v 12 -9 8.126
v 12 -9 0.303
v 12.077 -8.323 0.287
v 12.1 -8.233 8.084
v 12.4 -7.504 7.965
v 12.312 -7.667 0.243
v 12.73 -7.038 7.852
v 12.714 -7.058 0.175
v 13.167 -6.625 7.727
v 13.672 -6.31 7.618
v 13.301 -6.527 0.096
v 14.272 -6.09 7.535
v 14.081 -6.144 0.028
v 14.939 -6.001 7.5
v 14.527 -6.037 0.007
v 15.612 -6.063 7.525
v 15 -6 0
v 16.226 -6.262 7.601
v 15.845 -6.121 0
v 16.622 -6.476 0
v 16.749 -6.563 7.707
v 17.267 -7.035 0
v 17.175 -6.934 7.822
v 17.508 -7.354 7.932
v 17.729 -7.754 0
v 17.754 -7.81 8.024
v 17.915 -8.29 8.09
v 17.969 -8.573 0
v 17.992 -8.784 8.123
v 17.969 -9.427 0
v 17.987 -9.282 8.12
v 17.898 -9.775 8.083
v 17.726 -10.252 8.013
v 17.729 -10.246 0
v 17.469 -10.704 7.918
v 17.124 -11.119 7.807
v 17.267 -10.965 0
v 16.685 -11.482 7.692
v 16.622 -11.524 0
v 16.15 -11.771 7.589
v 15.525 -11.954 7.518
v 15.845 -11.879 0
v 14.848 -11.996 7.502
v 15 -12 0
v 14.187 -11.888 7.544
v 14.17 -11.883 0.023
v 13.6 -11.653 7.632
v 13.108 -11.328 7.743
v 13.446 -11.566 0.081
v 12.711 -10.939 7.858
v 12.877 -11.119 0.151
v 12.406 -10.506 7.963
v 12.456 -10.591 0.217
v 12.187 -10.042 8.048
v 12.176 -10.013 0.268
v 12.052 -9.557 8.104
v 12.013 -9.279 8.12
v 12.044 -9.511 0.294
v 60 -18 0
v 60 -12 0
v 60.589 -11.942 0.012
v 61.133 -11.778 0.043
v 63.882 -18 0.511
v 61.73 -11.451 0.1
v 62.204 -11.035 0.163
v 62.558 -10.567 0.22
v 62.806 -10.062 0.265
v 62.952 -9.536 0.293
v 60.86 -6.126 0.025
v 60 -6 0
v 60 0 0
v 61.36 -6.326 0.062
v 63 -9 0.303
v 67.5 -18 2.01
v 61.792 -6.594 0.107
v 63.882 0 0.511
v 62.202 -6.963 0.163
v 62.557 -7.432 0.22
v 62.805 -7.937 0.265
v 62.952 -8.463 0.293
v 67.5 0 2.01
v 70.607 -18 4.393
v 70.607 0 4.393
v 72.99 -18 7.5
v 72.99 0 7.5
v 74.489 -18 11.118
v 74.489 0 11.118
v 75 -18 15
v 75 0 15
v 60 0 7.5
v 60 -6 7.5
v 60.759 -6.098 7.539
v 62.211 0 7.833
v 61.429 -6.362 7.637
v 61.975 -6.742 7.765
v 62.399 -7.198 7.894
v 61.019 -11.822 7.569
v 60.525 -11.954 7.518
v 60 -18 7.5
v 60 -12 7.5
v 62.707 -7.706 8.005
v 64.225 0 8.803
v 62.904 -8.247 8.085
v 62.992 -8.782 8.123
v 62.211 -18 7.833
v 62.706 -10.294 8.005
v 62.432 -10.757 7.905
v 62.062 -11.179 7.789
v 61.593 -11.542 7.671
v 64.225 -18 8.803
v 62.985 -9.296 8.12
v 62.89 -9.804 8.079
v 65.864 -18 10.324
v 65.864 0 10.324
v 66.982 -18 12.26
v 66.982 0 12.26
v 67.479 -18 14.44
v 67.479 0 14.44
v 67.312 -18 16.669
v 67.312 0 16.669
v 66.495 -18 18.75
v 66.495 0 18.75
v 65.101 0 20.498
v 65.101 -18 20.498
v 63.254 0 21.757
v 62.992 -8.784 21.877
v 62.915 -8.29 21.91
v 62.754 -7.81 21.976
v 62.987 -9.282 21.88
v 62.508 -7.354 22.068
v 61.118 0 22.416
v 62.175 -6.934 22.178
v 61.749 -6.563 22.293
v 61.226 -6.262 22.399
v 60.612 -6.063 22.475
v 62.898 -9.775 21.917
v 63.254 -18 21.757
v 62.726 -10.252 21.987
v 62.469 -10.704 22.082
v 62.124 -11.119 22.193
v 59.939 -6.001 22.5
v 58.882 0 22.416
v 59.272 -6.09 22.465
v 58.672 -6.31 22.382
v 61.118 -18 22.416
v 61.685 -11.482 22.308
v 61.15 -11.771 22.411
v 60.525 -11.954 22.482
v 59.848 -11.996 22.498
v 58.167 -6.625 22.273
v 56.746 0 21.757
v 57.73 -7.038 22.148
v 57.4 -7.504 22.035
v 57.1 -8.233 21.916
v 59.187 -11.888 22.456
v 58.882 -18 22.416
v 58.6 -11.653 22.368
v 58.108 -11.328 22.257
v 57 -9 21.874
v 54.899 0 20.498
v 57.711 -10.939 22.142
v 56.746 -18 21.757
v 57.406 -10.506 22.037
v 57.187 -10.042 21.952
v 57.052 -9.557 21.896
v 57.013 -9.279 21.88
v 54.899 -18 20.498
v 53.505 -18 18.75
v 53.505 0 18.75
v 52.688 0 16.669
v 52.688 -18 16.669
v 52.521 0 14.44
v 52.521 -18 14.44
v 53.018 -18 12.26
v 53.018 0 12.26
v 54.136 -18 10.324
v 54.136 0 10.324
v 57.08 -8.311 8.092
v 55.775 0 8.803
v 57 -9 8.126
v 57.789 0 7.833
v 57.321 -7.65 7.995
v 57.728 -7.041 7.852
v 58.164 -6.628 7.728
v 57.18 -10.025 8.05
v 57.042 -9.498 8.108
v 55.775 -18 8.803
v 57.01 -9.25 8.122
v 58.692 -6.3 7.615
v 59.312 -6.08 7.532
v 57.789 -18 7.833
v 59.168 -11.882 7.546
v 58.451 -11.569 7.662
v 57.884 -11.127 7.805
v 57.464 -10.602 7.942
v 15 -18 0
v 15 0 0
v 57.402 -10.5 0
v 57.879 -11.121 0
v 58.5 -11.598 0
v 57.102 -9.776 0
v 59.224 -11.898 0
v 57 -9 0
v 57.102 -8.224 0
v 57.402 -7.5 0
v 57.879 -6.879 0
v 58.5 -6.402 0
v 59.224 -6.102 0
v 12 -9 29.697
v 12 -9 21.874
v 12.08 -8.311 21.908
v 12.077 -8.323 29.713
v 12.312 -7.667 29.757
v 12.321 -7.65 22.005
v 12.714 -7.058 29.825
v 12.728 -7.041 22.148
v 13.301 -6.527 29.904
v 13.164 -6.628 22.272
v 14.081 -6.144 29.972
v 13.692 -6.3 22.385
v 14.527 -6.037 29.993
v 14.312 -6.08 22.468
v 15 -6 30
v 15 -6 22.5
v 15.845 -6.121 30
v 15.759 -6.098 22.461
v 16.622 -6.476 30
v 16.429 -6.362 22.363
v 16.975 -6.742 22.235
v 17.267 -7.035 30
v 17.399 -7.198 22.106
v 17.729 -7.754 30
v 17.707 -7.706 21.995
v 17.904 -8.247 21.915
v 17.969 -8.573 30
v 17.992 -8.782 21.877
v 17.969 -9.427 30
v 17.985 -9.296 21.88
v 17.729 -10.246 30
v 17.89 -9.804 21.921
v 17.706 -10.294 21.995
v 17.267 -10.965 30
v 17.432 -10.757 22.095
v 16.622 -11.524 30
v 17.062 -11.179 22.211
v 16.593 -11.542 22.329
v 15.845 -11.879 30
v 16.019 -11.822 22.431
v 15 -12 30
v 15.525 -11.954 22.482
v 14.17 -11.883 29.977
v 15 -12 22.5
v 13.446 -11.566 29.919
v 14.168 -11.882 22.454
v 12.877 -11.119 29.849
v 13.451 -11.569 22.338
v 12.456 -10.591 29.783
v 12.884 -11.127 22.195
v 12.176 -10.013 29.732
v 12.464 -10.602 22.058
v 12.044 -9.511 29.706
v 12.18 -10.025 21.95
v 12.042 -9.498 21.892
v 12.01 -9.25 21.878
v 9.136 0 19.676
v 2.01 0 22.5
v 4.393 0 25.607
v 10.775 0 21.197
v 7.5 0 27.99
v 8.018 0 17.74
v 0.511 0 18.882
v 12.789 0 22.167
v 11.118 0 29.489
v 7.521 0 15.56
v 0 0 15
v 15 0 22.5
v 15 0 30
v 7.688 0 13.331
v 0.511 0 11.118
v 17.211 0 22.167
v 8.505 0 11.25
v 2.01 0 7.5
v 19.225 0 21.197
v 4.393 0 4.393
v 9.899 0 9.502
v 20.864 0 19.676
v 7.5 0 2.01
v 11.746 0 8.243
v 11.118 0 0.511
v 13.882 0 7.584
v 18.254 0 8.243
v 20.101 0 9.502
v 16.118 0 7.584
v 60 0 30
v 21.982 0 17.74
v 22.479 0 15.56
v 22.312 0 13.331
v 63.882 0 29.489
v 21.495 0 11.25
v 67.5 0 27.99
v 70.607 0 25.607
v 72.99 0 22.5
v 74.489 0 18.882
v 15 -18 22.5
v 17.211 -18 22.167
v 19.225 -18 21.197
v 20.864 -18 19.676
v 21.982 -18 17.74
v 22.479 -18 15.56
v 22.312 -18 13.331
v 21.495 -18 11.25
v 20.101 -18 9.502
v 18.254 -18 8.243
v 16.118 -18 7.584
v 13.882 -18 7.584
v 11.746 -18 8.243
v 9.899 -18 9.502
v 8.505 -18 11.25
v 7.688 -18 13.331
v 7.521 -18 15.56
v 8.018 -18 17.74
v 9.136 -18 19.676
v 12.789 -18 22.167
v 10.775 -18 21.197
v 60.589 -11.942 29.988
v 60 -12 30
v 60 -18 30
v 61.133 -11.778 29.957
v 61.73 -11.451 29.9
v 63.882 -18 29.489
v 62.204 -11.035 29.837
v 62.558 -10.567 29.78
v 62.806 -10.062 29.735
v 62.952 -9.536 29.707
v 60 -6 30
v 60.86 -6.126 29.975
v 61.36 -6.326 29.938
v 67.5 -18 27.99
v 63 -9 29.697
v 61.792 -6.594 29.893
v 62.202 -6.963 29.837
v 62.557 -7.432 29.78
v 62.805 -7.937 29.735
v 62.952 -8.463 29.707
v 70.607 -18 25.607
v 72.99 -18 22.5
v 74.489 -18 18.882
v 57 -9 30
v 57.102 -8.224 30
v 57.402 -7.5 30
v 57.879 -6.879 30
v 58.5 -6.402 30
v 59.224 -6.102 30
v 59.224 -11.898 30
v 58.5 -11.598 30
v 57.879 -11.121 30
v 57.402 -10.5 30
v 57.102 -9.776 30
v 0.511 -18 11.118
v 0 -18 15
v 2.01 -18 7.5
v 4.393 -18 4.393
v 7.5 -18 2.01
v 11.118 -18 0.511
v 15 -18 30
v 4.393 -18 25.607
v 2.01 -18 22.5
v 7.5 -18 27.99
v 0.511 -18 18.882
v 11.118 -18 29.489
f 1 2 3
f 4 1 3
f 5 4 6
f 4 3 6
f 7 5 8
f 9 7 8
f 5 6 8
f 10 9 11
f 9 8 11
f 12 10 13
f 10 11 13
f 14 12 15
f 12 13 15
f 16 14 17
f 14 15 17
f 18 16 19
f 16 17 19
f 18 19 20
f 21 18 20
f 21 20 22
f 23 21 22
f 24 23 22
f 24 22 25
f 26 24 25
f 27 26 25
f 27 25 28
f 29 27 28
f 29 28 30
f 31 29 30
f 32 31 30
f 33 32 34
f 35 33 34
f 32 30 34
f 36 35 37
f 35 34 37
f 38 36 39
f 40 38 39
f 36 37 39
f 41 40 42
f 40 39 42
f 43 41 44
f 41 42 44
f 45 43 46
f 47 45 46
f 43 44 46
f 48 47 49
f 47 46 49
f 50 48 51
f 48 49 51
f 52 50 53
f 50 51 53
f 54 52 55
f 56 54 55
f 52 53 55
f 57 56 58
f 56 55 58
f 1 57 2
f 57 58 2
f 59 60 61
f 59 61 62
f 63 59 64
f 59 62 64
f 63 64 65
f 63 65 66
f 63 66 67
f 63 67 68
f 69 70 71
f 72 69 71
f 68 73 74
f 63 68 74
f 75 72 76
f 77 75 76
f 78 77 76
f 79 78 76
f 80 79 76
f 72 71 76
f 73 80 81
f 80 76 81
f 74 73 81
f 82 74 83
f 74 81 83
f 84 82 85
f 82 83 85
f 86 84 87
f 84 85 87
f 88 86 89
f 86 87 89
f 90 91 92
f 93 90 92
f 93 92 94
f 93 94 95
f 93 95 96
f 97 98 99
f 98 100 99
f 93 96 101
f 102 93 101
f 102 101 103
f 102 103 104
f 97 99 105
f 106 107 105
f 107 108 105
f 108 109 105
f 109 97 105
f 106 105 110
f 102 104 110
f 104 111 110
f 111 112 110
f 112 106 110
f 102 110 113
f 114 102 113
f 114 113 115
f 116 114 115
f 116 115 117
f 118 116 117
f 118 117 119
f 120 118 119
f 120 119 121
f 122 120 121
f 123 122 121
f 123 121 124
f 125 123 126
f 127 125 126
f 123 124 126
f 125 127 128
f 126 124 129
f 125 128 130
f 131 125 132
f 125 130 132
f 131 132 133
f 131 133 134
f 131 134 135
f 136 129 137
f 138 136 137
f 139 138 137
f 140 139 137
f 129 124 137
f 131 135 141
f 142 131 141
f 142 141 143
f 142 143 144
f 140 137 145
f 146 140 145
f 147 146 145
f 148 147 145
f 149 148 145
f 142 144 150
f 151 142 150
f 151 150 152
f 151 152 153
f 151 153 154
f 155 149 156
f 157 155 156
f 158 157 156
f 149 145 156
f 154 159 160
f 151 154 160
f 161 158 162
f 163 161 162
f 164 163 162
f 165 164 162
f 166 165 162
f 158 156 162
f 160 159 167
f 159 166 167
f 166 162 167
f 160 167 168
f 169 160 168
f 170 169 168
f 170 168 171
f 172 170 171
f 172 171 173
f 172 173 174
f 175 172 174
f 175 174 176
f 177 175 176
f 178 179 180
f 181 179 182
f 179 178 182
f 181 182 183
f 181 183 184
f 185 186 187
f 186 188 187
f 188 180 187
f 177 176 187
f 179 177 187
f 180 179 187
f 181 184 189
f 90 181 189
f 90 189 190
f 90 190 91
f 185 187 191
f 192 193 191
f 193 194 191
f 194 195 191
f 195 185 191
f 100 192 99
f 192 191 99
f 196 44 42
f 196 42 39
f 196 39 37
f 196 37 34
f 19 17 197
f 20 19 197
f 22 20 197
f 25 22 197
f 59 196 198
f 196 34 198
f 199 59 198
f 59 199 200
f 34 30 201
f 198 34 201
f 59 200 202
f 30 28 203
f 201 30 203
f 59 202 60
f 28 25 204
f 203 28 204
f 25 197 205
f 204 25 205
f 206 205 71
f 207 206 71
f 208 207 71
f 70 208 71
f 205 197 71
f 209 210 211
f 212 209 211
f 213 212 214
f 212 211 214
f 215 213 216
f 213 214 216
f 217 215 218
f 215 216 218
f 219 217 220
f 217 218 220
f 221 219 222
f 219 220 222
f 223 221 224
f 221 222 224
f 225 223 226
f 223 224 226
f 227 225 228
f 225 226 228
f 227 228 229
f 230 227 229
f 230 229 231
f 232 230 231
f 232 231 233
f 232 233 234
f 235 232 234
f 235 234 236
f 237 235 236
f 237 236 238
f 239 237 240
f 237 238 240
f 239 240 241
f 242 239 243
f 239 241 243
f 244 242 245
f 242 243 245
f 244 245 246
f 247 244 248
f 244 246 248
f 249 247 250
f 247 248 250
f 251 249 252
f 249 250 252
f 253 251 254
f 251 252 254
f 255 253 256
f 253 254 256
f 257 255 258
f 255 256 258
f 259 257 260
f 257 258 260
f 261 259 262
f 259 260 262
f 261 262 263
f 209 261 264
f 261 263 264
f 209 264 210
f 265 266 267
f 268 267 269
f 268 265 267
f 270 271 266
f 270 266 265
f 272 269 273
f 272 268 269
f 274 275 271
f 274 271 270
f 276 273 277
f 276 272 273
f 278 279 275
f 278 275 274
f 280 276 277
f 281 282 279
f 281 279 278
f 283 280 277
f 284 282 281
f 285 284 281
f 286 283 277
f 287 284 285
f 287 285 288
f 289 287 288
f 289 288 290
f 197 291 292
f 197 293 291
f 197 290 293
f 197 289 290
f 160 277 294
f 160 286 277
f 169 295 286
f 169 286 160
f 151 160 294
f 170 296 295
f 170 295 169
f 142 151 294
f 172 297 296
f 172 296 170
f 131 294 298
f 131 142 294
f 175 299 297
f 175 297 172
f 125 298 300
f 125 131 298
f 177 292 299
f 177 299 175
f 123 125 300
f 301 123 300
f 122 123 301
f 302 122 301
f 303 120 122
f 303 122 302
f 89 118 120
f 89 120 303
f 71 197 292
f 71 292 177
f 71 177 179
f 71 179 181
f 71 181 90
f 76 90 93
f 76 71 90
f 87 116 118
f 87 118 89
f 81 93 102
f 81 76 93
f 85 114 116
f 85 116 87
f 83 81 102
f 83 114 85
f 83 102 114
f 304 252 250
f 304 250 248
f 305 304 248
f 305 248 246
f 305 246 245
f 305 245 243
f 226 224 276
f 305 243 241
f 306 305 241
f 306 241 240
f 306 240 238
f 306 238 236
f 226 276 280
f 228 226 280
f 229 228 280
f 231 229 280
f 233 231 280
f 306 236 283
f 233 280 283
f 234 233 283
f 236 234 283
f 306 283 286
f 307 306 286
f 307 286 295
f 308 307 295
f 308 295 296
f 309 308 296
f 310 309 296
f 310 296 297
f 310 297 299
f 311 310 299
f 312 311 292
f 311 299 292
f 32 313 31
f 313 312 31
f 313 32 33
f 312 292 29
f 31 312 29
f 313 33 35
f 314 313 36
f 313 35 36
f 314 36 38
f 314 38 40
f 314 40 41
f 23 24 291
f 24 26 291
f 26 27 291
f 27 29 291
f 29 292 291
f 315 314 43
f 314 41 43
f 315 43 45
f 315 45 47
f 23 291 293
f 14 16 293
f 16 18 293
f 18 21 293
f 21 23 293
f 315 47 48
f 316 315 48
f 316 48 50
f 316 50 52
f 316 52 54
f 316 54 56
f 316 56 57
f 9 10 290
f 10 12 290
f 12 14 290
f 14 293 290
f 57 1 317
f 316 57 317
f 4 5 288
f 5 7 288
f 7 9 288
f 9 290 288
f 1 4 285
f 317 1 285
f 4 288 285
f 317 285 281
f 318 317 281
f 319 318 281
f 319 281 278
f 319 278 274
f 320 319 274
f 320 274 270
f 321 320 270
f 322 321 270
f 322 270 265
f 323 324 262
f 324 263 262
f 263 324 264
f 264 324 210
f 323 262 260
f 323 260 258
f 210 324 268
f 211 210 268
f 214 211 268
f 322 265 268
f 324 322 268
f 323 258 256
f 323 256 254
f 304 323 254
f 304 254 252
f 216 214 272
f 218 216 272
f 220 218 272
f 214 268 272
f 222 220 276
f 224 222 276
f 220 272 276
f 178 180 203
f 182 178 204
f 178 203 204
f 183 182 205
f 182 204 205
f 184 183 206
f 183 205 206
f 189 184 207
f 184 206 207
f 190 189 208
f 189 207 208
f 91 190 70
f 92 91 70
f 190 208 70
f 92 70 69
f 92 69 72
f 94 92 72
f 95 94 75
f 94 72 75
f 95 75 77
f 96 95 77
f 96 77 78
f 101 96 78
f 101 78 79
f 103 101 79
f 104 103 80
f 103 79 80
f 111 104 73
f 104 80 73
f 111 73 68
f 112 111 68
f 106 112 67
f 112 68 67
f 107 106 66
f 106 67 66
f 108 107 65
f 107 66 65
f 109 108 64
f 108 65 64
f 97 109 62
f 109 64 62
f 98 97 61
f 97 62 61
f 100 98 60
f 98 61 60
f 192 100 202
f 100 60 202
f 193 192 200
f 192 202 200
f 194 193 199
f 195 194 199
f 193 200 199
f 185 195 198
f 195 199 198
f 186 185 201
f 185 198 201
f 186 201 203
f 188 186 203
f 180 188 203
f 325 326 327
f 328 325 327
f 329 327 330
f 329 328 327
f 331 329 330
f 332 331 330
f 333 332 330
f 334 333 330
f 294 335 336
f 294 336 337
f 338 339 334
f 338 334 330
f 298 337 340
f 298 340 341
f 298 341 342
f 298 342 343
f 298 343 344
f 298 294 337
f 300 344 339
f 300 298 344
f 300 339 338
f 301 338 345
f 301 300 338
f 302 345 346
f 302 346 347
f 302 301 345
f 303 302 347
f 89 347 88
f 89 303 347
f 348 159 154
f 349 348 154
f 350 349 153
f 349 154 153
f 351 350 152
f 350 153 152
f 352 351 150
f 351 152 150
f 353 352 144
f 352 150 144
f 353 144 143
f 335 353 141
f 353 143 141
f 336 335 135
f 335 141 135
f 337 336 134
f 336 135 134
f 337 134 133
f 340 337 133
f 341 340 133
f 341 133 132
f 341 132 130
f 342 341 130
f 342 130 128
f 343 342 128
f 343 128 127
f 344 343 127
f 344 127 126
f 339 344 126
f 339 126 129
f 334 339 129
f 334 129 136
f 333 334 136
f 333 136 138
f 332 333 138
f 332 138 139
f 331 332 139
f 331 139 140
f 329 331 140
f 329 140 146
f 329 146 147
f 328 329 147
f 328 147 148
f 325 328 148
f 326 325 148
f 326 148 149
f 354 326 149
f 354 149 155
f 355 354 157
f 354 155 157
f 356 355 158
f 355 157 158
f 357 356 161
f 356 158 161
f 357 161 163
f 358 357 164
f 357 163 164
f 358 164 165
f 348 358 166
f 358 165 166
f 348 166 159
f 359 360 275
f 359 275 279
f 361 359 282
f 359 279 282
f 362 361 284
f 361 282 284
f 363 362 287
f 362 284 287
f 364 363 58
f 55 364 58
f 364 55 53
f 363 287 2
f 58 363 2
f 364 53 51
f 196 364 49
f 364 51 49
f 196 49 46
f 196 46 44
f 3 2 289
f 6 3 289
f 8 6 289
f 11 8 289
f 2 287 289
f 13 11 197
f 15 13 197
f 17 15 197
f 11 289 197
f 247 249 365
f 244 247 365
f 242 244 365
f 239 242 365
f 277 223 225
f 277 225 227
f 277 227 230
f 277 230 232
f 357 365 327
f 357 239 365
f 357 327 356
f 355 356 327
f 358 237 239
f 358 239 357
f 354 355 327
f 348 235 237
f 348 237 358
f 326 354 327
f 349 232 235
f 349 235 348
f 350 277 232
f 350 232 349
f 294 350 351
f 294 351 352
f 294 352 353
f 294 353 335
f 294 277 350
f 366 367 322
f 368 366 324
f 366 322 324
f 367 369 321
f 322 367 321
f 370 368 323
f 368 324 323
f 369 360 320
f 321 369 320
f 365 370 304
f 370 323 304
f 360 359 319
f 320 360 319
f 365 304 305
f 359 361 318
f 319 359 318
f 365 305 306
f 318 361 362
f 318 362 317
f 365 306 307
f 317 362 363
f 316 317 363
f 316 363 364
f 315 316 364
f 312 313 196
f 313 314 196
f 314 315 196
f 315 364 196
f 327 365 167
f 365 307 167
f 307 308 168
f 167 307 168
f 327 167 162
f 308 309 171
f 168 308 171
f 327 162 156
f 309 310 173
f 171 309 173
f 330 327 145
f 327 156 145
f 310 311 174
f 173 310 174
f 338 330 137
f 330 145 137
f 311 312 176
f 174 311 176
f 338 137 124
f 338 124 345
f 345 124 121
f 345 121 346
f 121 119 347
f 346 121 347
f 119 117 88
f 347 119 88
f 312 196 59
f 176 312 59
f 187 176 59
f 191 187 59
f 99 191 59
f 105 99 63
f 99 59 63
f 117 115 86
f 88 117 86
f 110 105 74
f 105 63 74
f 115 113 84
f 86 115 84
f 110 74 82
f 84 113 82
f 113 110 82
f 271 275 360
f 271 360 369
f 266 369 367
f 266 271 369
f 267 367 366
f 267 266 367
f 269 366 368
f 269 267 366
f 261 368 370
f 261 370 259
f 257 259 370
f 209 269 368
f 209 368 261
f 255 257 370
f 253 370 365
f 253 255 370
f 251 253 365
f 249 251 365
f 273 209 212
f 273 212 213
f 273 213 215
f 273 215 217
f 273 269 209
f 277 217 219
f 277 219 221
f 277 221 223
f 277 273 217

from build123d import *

# Parameters (mm, degrees)
SKETCH_1_W          = 75
SKETCH_1_H          = 18
EXTRUDE_1_DEPTH     = 30
SKETCH_9_R          = 7.5
CUT_EXTRUDE_6_DEPTH = 100
FILLET_1_R          = 15
SKETCH_10_R         = 7.5
CUT_EXTRUDE_7_DEPTH = 50
SKETCH_11_R         = 3
CUT_EXTRUDE_8_DEPTH = 60


with BuildPart() as part:
    # 草图1 → 拉伸1 (new body)
    with BuildSketch(Plane.XY):
        with Locations((37.5, -9)):
            Rectangle(SKETCH_1_W, SKETCH_1_H)
    extrude(amount=EXTRUDE_1_DEPTH)

    # 草图9 → 切除-拉伸6 (cut)
    with BuildSketch(Plane(origin=(0, 0, 0), x_dir=(1, 0, 0), z_dir=(0, 1, 0))):
        with Locations(Location((15, -15, 0), (0, 0, 270))):
            Circle(SKETCH_9_R)
    extrude(amount=-CUT_EXTRUDE_6_DEPTH, mode=Mode.SUBTRACT)

    # 圆角1
    fillet_1_edges = [part.edges().sort_by_distance(p)[0] for p in [
        (75, -9, 0),
        (75, -9, 30),
        (0, -9, 0),
        (0, -9, 30),
    ]]
    fillet(fillet_1_edges, radius=FILLET_1_R - 0.0001)  # a hair under: the kernel refuses the full size

    # 草图10 → 切除-拉伸7 (cut)
    with BuildSketch(Plane.XZ.offset(18)):
        with Locations(Location((60, 15, 0), (0, 0, 270))):
            Circle(SKETCH_10_R)
    extrude(amount=-CUT_EXTRUDE_7_DEPTH, mode=Mode.SUBTRACT)

    # 草图11 → 切除-拉伸8 (cut)
    with BuildSketch(Plane(origin=(0, 0, 0), x_dir=(-1, 0, 0), z_dir=(0, 0, -1))):
        with Locations((-60, -9)):
            Circle(SKETCH_11_R)
        with Locations((-15, -9)):
            Circle(SKETCH_11_R)
    extrude(amount=-CUT_EXTRUDE_8_DEPTH, mode=Mode.SUBTRACT)


solid = part.part
